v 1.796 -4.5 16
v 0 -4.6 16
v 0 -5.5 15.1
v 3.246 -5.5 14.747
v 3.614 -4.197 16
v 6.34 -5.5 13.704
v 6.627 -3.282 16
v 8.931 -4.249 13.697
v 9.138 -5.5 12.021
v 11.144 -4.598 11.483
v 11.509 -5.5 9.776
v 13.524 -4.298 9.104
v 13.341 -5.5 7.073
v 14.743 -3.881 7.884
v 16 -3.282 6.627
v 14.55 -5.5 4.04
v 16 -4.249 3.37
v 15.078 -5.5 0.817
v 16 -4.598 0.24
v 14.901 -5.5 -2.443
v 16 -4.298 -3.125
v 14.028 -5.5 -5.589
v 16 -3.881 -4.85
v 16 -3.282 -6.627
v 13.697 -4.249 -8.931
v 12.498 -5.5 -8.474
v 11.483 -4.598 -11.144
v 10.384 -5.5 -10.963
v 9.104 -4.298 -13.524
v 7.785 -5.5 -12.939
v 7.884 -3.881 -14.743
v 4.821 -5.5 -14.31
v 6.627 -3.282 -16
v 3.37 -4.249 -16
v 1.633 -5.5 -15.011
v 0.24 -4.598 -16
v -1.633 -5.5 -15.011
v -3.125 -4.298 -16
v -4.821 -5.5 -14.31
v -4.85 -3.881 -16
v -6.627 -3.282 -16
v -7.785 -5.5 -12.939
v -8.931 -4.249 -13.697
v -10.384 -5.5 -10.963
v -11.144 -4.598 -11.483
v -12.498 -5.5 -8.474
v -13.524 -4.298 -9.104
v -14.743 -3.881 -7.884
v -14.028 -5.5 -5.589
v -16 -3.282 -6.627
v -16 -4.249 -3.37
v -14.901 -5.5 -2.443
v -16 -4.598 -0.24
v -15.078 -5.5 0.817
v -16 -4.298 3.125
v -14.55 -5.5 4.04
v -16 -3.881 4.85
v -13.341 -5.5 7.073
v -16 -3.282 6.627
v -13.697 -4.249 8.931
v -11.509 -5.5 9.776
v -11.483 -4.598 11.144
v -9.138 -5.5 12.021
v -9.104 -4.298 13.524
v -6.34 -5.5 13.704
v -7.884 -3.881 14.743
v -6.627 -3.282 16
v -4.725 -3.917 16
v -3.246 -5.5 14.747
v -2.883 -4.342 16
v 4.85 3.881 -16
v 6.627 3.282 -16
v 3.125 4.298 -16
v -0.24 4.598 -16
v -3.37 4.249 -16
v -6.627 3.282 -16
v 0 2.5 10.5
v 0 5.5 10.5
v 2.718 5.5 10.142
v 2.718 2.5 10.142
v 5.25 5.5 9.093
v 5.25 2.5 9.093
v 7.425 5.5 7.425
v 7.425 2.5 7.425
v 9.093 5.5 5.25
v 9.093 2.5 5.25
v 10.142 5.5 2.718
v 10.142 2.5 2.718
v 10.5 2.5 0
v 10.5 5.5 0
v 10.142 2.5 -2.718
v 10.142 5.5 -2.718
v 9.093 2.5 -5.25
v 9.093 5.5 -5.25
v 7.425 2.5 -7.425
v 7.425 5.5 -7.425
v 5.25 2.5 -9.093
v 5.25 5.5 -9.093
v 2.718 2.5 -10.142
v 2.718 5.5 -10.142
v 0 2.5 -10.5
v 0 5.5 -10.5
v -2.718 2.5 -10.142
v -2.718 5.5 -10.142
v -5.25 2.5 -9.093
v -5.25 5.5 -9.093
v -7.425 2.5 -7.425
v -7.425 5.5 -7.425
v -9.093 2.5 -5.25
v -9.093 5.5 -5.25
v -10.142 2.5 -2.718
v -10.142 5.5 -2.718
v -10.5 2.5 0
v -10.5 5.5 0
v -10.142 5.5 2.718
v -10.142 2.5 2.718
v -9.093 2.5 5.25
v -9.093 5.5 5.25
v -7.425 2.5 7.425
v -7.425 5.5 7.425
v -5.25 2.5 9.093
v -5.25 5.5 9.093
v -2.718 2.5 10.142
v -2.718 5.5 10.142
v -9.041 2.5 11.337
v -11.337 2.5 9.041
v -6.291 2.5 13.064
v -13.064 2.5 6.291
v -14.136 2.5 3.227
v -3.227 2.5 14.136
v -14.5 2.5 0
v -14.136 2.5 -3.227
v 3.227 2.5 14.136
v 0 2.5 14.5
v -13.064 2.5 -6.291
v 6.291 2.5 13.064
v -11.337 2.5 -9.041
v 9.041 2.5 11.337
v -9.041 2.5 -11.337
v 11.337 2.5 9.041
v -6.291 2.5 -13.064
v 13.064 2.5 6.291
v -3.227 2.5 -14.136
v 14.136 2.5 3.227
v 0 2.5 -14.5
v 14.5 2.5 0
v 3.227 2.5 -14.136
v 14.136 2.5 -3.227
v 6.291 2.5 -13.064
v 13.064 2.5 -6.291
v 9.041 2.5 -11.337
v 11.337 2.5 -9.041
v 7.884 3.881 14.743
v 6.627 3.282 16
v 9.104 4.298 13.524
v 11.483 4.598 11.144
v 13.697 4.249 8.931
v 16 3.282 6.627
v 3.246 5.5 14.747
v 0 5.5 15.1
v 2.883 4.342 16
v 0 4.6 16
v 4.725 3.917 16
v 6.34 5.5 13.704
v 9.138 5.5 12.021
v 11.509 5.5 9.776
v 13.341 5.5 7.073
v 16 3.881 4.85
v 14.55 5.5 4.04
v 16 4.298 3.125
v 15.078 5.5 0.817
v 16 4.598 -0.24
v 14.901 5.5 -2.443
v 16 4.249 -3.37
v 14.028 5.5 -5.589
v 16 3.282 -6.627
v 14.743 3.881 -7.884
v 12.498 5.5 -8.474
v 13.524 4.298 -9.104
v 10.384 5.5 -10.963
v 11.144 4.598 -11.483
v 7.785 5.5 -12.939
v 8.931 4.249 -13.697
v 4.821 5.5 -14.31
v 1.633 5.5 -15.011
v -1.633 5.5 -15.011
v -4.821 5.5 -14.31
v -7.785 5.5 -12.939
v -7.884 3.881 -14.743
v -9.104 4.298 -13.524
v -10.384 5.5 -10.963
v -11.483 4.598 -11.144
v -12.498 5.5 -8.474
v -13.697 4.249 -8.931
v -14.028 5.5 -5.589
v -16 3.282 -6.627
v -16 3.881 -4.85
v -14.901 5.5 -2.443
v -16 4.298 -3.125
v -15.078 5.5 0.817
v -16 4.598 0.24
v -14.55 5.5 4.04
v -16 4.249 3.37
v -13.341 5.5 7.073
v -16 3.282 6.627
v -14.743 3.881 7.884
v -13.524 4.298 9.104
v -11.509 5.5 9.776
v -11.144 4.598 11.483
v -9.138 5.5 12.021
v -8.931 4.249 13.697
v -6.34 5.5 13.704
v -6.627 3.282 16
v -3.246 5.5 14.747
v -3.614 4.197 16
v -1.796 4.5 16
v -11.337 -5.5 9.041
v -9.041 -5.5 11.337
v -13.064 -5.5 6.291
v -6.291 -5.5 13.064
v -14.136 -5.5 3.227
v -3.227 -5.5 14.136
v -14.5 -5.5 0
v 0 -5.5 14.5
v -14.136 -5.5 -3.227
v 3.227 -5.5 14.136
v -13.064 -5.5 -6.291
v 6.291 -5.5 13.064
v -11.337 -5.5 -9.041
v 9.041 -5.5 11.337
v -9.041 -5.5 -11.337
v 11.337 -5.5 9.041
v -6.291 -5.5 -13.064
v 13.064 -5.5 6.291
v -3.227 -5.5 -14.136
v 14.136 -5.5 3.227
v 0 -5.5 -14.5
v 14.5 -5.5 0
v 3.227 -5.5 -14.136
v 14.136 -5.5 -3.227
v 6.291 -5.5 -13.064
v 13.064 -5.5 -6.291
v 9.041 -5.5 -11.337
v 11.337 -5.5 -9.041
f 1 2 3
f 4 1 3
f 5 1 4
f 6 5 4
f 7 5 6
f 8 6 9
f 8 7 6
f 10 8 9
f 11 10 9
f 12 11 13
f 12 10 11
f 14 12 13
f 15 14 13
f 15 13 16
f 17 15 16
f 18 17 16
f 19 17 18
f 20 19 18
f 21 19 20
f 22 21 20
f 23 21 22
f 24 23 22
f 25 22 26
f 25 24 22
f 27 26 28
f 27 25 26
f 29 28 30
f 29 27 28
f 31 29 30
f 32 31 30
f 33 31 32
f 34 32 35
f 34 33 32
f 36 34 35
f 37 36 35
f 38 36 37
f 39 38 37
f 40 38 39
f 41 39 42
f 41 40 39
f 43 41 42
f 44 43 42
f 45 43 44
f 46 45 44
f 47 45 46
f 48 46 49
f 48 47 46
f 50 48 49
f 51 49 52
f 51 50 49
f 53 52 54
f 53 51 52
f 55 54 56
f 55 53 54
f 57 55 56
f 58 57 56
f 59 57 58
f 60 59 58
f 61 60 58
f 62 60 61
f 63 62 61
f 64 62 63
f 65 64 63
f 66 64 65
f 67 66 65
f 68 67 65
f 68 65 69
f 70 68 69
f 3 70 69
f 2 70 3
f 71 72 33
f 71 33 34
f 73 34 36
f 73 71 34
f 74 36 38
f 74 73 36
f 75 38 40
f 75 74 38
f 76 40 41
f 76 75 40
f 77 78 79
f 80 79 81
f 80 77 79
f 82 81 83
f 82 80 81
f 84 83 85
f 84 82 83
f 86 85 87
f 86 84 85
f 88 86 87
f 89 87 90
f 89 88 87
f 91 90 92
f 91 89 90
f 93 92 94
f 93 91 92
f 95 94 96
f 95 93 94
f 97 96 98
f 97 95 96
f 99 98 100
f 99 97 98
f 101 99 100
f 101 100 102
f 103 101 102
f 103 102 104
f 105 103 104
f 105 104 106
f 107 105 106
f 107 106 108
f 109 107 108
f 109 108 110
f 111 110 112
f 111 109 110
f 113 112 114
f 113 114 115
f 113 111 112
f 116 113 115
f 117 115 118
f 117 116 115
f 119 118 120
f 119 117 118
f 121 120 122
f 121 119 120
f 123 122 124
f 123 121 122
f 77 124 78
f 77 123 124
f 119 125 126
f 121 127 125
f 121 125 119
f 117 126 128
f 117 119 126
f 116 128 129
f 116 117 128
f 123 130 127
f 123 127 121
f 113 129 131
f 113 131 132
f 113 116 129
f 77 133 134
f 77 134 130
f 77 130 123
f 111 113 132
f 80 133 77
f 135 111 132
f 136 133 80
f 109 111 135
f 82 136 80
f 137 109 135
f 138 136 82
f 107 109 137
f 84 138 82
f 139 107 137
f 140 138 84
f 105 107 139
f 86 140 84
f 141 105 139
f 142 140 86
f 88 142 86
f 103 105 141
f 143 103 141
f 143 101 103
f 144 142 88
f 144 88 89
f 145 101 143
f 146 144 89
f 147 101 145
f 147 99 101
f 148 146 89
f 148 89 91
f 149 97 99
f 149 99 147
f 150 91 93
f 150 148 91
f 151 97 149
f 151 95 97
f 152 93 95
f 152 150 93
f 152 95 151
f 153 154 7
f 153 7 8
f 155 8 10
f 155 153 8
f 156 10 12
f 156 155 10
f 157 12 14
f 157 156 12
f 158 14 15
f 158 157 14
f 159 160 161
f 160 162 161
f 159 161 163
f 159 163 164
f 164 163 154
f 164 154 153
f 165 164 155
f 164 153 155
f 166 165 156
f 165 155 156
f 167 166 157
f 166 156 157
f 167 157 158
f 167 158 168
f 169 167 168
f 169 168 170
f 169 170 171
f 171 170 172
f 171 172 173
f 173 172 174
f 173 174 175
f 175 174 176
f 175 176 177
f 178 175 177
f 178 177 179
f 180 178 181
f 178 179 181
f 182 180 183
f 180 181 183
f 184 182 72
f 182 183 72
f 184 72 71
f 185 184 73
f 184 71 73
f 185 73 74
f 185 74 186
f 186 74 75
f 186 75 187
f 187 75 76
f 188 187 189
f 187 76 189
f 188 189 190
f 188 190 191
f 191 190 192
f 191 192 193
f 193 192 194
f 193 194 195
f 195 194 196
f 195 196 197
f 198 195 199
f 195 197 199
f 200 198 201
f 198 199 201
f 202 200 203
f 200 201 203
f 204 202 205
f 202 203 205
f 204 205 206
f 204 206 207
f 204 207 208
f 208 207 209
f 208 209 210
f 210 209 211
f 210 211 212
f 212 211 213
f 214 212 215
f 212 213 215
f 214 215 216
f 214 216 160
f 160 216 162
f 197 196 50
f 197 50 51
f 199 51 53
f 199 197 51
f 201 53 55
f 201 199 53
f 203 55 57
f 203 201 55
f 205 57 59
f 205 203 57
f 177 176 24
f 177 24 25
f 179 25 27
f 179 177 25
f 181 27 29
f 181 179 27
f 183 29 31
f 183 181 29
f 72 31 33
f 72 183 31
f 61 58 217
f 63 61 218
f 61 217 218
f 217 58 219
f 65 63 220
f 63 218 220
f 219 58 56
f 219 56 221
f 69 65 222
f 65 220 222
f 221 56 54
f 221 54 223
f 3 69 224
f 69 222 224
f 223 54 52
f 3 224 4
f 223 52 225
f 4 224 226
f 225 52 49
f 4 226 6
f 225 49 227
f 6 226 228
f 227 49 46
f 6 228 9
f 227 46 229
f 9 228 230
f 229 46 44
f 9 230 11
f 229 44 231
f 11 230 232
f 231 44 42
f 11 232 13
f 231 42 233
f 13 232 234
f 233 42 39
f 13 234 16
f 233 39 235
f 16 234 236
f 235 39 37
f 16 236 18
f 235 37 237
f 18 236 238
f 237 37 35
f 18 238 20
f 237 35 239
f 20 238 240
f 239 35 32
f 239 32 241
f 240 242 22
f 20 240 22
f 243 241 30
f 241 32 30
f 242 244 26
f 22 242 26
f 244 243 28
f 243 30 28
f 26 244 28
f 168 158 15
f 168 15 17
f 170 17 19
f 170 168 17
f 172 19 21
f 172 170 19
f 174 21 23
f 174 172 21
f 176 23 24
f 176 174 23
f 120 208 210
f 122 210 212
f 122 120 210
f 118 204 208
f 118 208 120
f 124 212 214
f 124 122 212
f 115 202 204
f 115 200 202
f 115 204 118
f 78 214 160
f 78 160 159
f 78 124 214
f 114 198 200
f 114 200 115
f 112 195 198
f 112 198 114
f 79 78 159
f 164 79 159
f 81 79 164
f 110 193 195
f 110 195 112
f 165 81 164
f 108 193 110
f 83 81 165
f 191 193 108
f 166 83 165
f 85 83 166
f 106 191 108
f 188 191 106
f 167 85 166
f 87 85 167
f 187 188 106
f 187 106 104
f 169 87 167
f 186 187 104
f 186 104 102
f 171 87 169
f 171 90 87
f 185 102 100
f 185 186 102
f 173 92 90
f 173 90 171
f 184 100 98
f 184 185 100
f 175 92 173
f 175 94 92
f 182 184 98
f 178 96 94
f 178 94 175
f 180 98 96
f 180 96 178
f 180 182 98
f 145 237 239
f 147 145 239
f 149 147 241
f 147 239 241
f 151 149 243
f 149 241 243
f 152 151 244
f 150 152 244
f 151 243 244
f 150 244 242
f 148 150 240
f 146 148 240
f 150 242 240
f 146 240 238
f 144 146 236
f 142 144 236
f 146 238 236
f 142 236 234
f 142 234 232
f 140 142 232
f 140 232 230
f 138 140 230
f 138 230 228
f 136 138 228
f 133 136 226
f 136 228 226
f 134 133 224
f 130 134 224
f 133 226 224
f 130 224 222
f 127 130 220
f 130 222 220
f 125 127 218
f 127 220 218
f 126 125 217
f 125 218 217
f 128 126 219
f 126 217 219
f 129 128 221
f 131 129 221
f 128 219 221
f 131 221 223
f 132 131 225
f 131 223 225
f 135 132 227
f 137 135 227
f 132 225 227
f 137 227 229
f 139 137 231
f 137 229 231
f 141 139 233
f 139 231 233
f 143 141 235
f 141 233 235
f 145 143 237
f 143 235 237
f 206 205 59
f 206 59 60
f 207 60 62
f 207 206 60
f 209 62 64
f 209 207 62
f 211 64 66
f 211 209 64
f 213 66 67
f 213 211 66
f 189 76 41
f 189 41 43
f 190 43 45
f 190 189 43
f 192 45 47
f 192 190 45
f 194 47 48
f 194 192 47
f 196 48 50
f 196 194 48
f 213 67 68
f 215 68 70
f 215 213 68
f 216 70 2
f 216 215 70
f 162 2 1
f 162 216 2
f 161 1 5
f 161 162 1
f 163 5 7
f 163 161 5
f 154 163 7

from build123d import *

# Parameters (mm, degrees)
SKETCH1_R           = 10.5
BOSS_EXTRUDE1_DEPTH = 5.5
SKETCH3_R           = 14.5
CUT_EXTRUDE1_DEPTH  = 8


with BuildPart() as part:
    # Sketch1 → Boss-Extrude1 (new, symmetric)
    with BuildSketch(Plane(origin=(0, 0, 0), x_dir=(1, 0, 0), z_dir=(0, 1, 0))):
        Polygon((6.627416998, 16), (-6.627416998, 16), (-16, 6.627416998), (-16, -6.627416998), (-6.627416998, -16), (6.627416998, -16), (16, -6.627416998), (16, 6.627416998), align=None)
        with Locations(Location((0, 0, 0), (0, 0, 270))):
            Circle(SKETCH1_R, mode=Mode.SUBTRACT)
    extrude(amount=BOSS_EXTRUDE1_DEPTH, both=True)

    # Sketch2 → Cut-Revolve1 (revolve, cut)
    with BuildSketch(Plane.XY, mode=Mode.PRIVATE) as cut_revolve1_sk:
        Polygon((-18.5, 2.1), (-18.5, 7.5), (-13.1, 7.5), align=None)
        Polygon((-13.1, -7.5), (-18.5, -2.1), (-18.5, -7.5), align=None)
    revolve(cut_revolve1_sk.sketch.rotate(Axis((0, 0, 0), (0, 1, 0)), 90), axis=Axis((0, 0, 0), (0, 1, 0)), mode=Mode.SUBTRACT)

    # Sketch3 → Cut-Extrude1 (cut)
    with BuildSketch(Plane.XZ.offset(5.5)):
        with Locations(Location((0, 0, 0), (0, 0, 270))):
            Circle(SKETCH3_R)
    extrude(amount=-CUT_EXTRUDE1_DEPTH, mode=Mode.SUBTRACT)


solid = part.part
